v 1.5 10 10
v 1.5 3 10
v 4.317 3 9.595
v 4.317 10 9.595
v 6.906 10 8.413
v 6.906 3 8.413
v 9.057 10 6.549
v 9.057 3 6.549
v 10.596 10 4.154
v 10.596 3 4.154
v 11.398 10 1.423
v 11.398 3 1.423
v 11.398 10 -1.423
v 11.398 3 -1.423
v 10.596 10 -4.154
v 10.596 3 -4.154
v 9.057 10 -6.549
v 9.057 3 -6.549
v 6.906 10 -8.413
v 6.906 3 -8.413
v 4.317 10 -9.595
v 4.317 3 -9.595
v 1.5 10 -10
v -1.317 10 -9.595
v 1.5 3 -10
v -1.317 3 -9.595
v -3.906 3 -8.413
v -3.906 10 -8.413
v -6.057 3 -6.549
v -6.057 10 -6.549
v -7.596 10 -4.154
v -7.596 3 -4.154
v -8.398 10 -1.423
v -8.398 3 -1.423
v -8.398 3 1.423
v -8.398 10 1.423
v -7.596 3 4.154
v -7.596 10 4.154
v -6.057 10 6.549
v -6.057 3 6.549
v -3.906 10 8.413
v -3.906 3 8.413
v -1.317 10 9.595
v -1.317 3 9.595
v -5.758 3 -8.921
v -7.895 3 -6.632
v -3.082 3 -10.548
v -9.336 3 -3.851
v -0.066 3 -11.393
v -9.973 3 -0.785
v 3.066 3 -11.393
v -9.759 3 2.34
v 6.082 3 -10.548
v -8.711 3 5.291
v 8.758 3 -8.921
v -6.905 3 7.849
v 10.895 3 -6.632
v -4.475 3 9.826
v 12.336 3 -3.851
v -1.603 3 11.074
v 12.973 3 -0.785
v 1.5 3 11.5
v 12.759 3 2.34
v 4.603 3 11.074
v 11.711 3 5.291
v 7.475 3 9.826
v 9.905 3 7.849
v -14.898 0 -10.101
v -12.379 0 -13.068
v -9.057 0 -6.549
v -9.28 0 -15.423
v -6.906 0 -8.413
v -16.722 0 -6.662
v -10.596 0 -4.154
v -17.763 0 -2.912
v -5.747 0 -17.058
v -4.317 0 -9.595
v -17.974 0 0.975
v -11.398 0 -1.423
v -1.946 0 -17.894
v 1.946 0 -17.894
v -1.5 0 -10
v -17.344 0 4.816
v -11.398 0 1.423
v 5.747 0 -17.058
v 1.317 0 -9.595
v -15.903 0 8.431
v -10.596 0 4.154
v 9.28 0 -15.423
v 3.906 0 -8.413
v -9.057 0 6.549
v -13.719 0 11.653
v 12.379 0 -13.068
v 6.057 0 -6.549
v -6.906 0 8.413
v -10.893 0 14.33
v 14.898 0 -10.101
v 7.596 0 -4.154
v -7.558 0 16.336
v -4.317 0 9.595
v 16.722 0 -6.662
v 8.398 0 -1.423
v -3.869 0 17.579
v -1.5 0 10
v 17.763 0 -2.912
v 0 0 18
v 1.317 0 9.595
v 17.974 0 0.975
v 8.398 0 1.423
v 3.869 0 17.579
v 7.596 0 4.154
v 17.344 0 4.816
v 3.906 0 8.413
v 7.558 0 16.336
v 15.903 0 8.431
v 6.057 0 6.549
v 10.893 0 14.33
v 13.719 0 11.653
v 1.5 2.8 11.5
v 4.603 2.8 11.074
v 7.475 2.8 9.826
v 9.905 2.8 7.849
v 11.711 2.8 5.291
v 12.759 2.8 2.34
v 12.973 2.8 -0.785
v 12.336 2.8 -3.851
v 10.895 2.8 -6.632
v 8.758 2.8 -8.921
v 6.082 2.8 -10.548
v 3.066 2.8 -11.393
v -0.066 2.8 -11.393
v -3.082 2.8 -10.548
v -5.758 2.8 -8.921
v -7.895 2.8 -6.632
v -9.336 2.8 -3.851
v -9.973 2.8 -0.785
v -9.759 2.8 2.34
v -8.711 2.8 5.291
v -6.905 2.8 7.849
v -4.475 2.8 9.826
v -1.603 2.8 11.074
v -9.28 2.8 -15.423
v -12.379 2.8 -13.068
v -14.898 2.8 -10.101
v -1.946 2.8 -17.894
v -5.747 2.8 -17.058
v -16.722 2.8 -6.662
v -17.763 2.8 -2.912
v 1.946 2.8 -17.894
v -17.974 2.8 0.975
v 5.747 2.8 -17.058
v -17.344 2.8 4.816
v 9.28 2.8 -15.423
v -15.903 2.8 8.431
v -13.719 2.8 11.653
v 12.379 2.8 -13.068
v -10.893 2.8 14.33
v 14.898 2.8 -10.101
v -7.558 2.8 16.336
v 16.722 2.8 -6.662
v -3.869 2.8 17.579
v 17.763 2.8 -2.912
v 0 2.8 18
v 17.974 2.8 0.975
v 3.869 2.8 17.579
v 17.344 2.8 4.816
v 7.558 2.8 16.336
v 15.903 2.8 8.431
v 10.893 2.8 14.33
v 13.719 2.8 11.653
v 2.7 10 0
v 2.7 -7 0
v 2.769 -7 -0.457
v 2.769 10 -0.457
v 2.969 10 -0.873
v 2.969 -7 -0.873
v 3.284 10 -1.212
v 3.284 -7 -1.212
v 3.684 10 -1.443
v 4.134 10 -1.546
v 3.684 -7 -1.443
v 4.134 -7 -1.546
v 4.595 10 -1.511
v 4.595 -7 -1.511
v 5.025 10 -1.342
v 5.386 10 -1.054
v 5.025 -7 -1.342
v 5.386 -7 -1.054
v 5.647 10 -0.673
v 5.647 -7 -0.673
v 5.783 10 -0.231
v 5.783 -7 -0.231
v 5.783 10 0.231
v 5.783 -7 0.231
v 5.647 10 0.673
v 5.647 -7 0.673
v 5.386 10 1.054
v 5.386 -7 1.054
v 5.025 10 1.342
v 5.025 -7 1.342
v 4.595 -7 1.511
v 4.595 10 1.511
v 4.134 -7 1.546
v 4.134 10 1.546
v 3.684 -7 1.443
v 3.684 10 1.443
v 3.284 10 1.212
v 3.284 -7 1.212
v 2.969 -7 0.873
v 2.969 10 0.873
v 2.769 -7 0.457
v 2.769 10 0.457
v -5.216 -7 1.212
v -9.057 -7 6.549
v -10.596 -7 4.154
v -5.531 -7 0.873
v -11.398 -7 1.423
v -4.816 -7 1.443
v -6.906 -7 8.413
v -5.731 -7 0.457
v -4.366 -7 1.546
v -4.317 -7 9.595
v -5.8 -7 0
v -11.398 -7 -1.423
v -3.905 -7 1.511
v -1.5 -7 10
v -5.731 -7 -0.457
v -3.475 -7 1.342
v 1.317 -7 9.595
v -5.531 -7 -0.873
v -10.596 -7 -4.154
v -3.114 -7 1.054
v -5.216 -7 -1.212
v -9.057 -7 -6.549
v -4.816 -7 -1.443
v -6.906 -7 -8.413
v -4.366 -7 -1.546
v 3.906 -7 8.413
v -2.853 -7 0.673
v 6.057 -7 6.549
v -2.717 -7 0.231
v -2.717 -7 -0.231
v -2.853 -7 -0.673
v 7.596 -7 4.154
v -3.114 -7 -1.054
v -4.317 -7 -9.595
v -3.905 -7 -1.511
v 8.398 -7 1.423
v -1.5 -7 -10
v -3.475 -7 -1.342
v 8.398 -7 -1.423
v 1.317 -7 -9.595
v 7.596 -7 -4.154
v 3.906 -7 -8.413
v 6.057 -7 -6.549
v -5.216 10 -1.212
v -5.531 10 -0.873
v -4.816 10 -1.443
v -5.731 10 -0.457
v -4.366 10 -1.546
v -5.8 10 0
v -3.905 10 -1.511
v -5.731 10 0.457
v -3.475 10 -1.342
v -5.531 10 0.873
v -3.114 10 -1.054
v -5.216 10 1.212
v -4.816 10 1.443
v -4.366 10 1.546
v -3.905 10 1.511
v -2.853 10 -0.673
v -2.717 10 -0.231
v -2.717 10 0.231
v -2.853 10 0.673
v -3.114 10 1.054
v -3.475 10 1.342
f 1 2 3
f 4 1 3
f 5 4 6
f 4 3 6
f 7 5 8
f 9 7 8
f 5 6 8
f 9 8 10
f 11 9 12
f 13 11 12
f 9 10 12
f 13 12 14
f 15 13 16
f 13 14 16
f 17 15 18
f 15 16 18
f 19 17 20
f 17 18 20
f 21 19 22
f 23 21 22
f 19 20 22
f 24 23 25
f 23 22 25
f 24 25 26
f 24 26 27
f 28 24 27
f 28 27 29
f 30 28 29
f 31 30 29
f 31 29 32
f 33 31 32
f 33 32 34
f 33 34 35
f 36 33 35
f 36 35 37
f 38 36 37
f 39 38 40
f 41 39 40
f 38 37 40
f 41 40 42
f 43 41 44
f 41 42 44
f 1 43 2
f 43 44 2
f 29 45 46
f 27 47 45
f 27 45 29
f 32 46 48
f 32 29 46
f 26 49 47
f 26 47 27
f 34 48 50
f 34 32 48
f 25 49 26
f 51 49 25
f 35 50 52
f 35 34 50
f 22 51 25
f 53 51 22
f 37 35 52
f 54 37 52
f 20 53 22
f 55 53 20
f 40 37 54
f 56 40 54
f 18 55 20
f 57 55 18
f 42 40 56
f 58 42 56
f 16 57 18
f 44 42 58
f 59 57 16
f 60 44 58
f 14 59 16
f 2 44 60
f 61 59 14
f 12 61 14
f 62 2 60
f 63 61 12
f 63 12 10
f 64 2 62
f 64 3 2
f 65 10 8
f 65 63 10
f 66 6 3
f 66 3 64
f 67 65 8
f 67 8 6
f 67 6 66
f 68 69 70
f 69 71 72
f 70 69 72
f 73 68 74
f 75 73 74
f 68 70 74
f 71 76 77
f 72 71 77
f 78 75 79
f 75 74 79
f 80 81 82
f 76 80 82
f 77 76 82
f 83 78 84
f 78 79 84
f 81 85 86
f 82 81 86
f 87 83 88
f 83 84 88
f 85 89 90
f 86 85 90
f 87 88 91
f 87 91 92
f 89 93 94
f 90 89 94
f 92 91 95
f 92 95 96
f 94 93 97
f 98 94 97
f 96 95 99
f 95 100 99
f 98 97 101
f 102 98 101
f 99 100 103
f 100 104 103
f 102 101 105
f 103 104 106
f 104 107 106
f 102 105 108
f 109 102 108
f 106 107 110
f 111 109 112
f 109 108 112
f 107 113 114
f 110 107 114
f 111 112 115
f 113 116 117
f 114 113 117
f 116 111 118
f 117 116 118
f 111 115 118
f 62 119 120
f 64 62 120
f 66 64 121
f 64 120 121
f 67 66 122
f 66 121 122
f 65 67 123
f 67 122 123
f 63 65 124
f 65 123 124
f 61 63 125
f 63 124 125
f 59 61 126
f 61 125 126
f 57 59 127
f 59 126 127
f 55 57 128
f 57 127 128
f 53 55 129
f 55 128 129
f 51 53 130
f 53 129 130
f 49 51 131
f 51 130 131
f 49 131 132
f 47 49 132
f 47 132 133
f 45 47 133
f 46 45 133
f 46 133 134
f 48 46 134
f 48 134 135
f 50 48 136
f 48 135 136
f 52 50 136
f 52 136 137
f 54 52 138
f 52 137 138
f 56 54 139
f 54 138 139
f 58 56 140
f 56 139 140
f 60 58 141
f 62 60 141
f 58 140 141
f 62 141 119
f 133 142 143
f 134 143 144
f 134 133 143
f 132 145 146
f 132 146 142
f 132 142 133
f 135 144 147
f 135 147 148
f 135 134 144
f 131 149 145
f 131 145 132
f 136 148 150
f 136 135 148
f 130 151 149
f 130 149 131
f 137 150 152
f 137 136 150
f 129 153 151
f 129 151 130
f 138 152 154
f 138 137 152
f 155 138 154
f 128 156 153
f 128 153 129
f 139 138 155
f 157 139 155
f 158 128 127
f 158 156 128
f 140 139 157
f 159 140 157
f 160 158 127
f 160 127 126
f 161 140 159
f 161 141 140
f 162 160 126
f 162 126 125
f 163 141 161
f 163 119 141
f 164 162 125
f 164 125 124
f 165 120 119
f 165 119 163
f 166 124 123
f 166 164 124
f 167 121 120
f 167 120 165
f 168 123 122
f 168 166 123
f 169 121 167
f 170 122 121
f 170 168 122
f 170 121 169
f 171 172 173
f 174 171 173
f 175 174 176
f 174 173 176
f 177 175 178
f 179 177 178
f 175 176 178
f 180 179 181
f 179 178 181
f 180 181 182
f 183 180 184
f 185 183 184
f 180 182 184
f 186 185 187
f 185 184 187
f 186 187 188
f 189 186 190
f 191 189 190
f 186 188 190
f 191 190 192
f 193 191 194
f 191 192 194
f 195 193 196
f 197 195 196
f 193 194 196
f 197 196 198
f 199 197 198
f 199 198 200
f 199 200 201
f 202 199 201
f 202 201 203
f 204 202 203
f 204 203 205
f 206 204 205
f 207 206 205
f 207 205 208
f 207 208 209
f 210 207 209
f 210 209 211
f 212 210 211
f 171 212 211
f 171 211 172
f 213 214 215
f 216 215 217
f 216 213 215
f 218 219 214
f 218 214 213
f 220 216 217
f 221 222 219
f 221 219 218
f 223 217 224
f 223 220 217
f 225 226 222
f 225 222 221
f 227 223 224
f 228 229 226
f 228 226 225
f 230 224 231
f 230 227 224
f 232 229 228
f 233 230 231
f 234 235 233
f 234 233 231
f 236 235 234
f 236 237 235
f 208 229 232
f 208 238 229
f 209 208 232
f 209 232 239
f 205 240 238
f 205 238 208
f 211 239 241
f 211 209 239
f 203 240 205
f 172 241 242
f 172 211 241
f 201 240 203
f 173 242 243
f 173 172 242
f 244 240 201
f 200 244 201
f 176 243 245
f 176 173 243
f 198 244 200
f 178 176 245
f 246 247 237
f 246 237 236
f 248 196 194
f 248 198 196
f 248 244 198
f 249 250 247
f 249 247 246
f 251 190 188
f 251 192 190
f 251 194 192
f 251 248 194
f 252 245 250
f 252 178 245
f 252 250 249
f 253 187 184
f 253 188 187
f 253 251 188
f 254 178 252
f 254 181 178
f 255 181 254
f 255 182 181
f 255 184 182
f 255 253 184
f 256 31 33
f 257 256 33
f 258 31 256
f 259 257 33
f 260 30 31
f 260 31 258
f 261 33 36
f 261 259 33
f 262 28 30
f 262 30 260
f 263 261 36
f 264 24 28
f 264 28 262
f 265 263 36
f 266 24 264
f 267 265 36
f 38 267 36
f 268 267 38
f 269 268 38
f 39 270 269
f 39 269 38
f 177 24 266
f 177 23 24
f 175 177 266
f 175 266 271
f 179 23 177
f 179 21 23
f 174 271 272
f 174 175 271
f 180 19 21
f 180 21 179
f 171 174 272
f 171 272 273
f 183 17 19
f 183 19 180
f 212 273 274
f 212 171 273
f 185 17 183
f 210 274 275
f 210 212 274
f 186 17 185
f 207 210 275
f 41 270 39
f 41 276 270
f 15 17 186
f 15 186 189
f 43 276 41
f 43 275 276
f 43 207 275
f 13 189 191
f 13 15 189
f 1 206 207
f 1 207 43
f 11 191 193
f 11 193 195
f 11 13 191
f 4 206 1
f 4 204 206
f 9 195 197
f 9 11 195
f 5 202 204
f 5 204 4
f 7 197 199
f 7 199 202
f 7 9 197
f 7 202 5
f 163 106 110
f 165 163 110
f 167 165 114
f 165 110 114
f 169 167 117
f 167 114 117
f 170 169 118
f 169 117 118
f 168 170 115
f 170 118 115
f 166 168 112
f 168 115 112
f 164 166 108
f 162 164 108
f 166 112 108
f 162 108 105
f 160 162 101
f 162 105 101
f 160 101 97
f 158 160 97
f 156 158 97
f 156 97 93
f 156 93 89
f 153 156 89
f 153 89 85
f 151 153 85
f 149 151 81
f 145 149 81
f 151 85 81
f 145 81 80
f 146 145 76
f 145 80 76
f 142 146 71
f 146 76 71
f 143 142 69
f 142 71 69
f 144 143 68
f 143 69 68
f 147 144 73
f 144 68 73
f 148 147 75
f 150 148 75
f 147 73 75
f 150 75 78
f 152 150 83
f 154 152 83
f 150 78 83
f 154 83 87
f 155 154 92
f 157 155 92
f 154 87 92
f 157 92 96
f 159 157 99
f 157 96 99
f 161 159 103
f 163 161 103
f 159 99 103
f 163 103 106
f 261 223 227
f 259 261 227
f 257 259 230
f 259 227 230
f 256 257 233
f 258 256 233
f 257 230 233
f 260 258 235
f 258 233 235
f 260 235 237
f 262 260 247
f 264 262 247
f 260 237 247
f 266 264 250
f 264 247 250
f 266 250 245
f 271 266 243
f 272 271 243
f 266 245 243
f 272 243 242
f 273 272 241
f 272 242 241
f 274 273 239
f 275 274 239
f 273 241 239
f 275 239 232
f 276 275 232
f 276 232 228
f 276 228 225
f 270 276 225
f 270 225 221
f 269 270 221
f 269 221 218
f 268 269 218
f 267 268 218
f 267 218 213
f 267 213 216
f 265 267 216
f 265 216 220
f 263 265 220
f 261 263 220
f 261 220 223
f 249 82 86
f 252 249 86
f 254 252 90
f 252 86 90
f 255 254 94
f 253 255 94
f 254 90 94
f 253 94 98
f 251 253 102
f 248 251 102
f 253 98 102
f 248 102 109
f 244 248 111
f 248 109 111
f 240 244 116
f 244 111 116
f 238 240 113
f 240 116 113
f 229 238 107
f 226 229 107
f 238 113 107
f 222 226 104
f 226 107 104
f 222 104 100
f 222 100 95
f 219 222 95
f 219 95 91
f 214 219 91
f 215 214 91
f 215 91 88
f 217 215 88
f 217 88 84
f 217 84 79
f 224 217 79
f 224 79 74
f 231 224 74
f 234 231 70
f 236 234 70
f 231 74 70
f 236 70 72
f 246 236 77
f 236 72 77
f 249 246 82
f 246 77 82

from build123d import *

# Parameters (mm, degrees)
SKIZZE1_R                        = 18
AUFSATZ_LINEAR_AUSTRAGEN1_DEPTH  = 2.8
SKIZZE2_R                        = 11.5
AUFSATZ_LINEAR_AUSTRAGEN2_DEPTH  = 0.2
SKIZZE3_R                        = 10
AUFSATZ_LINEAR_AUSTRAGEN3_DEPTH  = 7
SKIZZE4_R                        = 10
AUFSATZ_LINEAR_AUSTRAGEN4_DEPTH  = 7
F_3_1_3_1_DURCHMESSER_BOHRUNG1_D = 3.1


with BuildPart() as part:
    # Skizze1 → Aufsatz-Linear austragen1 (new body)
    with BuildSketch(Plane(origin=(0, 0, 0), x_dir=(1, 0, 0), z_dir=(0, 1, 0))):
        with Locations(Location((0, 0, 0), (0, 0, 270))):
            Circle(SKIZZE1_R)
    extrude(amount=AUFSATZ_LINEAR_AUSTRAGEN1_DEPTH)

    # Skizze2 → Aufsatz-Linear austragen2 (add)
    with BuildSketch(Plane(origin=(0, 2.8, 0), x_dir=(1, 0, 0), z_dir=(0, 1, 0))):
        with Locations(Location((1.5, 0, 0), (0, 0, 270))):
            Circle(SKIZZE2_R)
    extrude(amount=AUFSATZ_LINEAR_AUSTRAGEN2_DEPTH)

    # Skizze3 → Aufsatz-Linear austragen3 (add)
    with BuildSketch(Plane(origin=(0, 3, 0), x_dir=(1, 0, 0), z_dir=(0, 1, 0))):
        with Locations(Location((1.5, 0, 0), (0, 0, 270))):
            Circle(SKIZZE3_R)
    extrude(amount=AUFSATZ_LINEAR_AUSTRAGEN3_DEPTH)

    # Skizze4 → Aufsatz-Linear austragen4 (add)
    with BuildSketch(Plane.XZ):
        with Locations(Location((-1.5, 0, 0), (0, 0, 270))):
            Circle(SKIZZE4_R)
    extrude(amount=AUFSATZ_LINEAR_AUSTRAGEN4_DEPTH)

    # Ø3.1 (3.1) Durchmesser Bohrung1 (through all)
    with Locations(Plane(origin=(0, 10, 0), x_dir=(1, 0, 0), z_dir=(0, 1, 0))):
        with Locations((4.25, 0), (-4.25, 0)):
            Hole(F_3_1_3_1_DURCHMESSER_BOHRUNG1_D / 2)


solid = part.part
